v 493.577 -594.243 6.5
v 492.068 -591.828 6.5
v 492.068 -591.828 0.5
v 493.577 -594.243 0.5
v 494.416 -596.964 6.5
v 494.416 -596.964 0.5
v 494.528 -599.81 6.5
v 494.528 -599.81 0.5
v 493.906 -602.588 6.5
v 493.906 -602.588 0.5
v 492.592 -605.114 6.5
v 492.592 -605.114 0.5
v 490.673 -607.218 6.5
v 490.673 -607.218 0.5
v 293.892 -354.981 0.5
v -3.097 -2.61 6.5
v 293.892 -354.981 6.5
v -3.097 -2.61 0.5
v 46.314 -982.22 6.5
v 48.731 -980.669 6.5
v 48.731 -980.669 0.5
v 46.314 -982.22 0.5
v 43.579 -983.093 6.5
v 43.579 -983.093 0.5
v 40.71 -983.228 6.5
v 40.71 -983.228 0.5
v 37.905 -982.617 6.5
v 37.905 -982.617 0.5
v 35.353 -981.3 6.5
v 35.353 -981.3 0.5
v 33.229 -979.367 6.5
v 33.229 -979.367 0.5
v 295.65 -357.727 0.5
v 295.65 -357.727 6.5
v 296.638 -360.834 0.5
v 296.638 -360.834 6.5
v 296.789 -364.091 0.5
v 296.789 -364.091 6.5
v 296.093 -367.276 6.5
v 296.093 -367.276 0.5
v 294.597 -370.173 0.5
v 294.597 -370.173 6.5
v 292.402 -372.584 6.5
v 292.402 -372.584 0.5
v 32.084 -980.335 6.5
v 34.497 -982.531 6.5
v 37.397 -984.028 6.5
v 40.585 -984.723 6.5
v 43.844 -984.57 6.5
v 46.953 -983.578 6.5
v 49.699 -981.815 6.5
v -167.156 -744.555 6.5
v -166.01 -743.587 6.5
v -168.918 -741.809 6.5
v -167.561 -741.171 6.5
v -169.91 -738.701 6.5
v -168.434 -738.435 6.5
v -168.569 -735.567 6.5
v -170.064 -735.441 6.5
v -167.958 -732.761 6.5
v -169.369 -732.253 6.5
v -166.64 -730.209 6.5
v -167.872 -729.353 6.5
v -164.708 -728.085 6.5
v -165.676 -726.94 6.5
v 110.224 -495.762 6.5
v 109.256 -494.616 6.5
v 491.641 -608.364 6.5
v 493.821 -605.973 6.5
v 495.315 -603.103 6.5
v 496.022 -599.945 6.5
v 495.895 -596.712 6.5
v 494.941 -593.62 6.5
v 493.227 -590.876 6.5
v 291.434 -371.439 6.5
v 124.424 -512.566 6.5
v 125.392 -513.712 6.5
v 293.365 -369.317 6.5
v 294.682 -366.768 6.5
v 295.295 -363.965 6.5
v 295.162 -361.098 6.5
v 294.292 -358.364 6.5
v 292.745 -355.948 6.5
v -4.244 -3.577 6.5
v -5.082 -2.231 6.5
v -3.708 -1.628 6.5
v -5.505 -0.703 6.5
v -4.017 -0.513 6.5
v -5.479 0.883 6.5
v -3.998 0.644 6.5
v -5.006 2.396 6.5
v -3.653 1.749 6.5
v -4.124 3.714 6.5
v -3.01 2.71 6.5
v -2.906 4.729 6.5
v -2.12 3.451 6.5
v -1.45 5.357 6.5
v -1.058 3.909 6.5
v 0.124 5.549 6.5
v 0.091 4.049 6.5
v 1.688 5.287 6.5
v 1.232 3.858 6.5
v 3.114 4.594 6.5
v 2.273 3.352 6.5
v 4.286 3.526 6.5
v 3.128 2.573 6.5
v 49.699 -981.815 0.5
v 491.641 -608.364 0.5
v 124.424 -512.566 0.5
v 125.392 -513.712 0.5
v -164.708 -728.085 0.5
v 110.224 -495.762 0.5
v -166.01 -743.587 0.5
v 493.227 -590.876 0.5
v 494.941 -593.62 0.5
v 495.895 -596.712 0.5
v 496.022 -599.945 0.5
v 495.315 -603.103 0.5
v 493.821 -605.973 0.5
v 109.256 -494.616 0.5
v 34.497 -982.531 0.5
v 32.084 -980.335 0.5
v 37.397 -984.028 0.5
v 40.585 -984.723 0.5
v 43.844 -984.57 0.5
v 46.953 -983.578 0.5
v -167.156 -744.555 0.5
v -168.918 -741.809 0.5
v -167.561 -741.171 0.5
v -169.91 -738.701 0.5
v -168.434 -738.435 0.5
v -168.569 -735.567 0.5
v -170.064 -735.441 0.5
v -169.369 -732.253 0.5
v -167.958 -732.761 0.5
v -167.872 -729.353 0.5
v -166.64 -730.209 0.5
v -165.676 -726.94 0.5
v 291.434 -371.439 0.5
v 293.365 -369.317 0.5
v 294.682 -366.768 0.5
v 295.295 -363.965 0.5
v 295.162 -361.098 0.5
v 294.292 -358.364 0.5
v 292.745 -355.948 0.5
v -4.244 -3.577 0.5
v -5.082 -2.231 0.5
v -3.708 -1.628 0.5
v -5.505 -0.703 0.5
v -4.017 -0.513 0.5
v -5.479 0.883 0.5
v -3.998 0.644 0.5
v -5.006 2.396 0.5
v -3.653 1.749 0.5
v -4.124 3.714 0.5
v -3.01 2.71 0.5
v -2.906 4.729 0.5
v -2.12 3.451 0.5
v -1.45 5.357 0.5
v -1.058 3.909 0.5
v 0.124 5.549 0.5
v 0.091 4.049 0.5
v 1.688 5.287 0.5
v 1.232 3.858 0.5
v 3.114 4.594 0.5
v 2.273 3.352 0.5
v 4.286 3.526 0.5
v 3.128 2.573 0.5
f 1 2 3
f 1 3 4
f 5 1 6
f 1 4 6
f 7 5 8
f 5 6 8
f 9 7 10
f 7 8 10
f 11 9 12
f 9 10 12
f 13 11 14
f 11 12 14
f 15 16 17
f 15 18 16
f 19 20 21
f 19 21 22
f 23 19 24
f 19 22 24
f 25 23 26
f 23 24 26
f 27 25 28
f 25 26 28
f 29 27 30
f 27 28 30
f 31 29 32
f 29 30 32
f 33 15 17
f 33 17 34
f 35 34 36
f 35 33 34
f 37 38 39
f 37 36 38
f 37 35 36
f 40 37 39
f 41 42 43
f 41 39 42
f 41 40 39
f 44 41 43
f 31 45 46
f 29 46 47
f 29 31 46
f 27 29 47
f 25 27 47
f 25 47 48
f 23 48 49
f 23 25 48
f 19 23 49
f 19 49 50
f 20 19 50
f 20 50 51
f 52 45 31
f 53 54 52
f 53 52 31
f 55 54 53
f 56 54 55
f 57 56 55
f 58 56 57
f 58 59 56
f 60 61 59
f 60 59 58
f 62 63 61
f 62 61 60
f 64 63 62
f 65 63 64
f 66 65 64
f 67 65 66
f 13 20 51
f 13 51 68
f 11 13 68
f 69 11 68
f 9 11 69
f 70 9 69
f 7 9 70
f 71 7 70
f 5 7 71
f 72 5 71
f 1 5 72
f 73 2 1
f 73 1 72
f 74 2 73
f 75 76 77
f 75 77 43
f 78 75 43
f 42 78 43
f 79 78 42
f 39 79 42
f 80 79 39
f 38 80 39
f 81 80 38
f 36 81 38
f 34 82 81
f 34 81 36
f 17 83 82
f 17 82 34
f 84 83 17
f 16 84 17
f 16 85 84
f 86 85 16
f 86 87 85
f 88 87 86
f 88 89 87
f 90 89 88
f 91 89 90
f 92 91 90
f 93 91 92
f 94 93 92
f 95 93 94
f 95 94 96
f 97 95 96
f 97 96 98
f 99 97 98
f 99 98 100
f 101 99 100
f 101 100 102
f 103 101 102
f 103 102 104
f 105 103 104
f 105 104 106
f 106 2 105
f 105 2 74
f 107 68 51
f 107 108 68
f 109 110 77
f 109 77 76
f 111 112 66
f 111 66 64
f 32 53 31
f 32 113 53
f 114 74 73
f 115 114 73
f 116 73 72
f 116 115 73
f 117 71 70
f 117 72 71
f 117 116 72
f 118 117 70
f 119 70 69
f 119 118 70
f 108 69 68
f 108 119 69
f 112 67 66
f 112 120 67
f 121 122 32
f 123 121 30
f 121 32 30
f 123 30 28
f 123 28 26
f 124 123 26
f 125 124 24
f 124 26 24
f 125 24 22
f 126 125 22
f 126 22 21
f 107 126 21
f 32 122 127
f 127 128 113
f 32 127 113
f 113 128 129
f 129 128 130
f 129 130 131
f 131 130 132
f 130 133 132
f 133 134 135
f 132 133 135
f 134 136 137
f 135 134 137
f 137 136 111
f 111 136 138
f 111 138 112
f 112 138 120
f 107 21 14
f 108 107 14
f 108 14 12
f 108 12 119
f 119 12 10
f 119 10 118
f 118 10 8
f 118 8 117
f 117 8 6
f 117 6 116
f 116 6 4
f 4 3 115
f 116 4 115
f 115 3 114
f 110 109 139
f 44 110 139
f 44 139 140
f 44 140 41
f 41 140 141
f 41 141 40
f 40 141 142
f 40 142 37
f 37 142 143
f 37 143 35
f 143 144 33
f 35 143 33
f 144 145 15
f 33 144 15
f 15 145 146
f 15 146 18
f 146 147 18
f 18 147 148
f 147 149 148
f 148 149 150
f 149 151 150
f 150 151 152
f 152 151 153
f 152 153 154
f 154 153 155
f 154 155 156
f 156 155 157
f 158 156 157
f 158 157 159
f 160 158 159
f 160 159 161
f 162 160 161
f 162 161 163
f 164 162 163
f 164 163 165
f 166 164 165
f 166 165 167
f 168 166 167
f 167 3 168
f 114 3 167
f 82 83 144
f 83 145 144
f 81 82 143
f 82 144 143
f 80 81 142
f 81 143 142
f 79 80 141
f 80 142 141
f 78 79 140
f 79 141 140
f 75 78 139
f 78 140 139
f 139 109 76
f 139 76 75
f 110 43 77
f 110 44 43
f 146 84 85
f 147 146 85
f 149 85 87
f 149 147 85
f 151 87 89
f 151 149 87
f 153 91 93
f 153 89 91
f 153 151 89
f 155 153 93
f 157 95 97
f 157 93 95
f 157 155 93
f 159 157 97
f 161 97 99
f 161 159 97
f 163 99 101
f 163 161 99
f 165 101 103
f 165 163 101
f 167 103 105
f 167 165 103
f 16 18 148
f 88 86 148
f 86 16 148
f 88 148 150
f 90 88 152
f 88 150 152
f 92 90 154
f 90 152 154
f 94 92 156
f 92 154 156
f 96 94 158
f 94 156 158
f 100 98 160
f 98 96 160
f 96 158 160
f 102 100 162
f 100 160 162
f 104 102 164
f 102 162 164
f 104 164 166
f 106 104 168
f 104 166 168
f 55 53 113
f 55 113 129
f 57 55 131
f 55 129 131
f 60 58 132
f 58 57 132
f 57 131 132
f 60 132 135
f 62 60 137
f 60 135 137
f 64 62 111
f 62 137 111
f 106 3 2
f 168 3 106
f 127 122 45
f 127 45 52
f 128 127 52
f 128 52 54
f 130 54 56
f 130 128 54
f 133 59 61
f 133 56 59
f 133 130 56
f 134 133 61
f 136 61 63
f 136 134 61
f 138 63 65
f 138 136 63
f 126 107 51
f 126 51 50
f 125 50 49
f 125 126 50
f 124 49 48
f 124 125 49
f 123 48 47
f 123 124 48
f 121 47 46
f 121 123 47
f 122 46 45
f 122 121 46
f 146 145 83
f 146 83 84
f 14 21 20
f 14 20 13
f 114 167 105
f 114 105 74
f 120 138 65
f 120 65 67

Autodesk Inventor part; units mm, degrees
ref_plane "YZ Plane" through (0, 0, 0) normal (1, 0, 0) x (0, 1, 0)
ref_plane "XZ Plane" through (0, 0, 0) normal (0, 1, 0) x (-1, 0, 0)
ref_plane "Work Plane1" through (0, 0, 0.5) normal (0, 0, 1) x (1, 0, 0)
sketch "Sketch1" plane through (0, 0, 0.5) normal (0, 0, 1) x (1, 0, 0)
  arc A0 (4.1391, 2.5087) -> (3.9017, 2.864) centre (0, 0) ccw construction
  arc A1 (1.2602, 4.4787) -> (2.2758, 4.058) centre (1.7603, 4.2498) ccw construction
  circle A2 centre (0, 0) radius 4.05 construction
  circle A3 centre (284.3339, -363.0367) radius 11 construction
  circle A4 centre (483.573, -598.8165) radius 11 construction
  circle A5 centre (41.6311, -972.2671) radius 11 construction
  circle A6 centre (-157.608, -736.4873) radius 11 construction
  line L0 (110.2354, -491.8247) -> (106.3399, -495.1165) construction
  line L1 (108.2876, -493.4706) -> (162.0638, -557.1094) construction
  line L2 (110.2239, -495.762) -> (-164.7078, -728.0854)
  line L3 (-166.0099, -743.5871) -> (33.2292, -979.3669)
  line L4 (48.7309, -980.669) -> (490.6728, -607.2184)
  line L5 (492.0682, -591.8285) -> (3.1278, 2.5728)
  arc A7 (3.1278, 2.5728) -> (-3.0968, -2.6101) centre (0, 0) ccw
  arc A8 (-164.7078, -728.0854) -> (-166.0099, -743.5871) centre (-157.608, -736.4873) ccw
  arc A9 (33.2292, -979.3669) -> (48.7309, -980.669) centre (41.6311, -972.2671) ccw
  arc A10 (490.6728, -607.2184) -> (492.0682, -591.8285) centre (483.573, -598.8165) ccw
  circle A11 centre (284.3339, -363.0367) radius 12.5 construction
  line L6 (292.4019, -372.5844) -> (125.3917, -513.7116)
  line L7 (-3.0968, -2.6101) -> (293.8919, -354.981)
  arc A12 (292.4019, -372.5844) -> (293.8919, -354.981) centre (284.3339, -363.0367) ccw
  line L8 (124.4236, -512.5659) -> (291.4337, -371.4387)
  arc A13 (291.4337, -371.4387) -> (292.7449, -355.9477) centre (284.3339, -363.0367) ccw
  line L9 (292.7449, -355.9477) -> (-4.2437, -3.5768)
  arc A14 (4.2862, 3.5257) -> (-4.2437, -3.5768) centre (0, 0) ccw
  line L10 (4.2862, 3.5257) -> (493.2266, -590.8756)
  arc A15 (491.641, -608.3641) -> (493.2266, -590.8756) centre (483.573, -598.8165) ccw
  line L11 (491.641, -608.3641) -> (49.6991, -981.8147)
  arc A16 (32.0835, -980.335) -> (49.6991, -981.8147) centre (41.6311, -972.2671) ccw
  line L12 (32.0835, -980.335) -> (-167.1556, -744.5553)
  arc A17 (-165.6759, -726.9396) -> (-167.1556, -744.5553) centre (-157.608, -736.4873) ccw
  line L13 (-165.6759, -726.9396) -> (109.2558, -494.6163)
  line L14 (125.3917, -513.7116) -> (124.4236, -512.5659)
  line L15 (109.2558, -494.6163) -> (110.2239, -495.762)
  point P0 (0, 0)
extrude "Extrusion1" add sketch "Sketch1" along normal blind 6
equation "\"d2\" = d1"
equation "\"d1\" = 1.5"
properties part number "Belt1"
